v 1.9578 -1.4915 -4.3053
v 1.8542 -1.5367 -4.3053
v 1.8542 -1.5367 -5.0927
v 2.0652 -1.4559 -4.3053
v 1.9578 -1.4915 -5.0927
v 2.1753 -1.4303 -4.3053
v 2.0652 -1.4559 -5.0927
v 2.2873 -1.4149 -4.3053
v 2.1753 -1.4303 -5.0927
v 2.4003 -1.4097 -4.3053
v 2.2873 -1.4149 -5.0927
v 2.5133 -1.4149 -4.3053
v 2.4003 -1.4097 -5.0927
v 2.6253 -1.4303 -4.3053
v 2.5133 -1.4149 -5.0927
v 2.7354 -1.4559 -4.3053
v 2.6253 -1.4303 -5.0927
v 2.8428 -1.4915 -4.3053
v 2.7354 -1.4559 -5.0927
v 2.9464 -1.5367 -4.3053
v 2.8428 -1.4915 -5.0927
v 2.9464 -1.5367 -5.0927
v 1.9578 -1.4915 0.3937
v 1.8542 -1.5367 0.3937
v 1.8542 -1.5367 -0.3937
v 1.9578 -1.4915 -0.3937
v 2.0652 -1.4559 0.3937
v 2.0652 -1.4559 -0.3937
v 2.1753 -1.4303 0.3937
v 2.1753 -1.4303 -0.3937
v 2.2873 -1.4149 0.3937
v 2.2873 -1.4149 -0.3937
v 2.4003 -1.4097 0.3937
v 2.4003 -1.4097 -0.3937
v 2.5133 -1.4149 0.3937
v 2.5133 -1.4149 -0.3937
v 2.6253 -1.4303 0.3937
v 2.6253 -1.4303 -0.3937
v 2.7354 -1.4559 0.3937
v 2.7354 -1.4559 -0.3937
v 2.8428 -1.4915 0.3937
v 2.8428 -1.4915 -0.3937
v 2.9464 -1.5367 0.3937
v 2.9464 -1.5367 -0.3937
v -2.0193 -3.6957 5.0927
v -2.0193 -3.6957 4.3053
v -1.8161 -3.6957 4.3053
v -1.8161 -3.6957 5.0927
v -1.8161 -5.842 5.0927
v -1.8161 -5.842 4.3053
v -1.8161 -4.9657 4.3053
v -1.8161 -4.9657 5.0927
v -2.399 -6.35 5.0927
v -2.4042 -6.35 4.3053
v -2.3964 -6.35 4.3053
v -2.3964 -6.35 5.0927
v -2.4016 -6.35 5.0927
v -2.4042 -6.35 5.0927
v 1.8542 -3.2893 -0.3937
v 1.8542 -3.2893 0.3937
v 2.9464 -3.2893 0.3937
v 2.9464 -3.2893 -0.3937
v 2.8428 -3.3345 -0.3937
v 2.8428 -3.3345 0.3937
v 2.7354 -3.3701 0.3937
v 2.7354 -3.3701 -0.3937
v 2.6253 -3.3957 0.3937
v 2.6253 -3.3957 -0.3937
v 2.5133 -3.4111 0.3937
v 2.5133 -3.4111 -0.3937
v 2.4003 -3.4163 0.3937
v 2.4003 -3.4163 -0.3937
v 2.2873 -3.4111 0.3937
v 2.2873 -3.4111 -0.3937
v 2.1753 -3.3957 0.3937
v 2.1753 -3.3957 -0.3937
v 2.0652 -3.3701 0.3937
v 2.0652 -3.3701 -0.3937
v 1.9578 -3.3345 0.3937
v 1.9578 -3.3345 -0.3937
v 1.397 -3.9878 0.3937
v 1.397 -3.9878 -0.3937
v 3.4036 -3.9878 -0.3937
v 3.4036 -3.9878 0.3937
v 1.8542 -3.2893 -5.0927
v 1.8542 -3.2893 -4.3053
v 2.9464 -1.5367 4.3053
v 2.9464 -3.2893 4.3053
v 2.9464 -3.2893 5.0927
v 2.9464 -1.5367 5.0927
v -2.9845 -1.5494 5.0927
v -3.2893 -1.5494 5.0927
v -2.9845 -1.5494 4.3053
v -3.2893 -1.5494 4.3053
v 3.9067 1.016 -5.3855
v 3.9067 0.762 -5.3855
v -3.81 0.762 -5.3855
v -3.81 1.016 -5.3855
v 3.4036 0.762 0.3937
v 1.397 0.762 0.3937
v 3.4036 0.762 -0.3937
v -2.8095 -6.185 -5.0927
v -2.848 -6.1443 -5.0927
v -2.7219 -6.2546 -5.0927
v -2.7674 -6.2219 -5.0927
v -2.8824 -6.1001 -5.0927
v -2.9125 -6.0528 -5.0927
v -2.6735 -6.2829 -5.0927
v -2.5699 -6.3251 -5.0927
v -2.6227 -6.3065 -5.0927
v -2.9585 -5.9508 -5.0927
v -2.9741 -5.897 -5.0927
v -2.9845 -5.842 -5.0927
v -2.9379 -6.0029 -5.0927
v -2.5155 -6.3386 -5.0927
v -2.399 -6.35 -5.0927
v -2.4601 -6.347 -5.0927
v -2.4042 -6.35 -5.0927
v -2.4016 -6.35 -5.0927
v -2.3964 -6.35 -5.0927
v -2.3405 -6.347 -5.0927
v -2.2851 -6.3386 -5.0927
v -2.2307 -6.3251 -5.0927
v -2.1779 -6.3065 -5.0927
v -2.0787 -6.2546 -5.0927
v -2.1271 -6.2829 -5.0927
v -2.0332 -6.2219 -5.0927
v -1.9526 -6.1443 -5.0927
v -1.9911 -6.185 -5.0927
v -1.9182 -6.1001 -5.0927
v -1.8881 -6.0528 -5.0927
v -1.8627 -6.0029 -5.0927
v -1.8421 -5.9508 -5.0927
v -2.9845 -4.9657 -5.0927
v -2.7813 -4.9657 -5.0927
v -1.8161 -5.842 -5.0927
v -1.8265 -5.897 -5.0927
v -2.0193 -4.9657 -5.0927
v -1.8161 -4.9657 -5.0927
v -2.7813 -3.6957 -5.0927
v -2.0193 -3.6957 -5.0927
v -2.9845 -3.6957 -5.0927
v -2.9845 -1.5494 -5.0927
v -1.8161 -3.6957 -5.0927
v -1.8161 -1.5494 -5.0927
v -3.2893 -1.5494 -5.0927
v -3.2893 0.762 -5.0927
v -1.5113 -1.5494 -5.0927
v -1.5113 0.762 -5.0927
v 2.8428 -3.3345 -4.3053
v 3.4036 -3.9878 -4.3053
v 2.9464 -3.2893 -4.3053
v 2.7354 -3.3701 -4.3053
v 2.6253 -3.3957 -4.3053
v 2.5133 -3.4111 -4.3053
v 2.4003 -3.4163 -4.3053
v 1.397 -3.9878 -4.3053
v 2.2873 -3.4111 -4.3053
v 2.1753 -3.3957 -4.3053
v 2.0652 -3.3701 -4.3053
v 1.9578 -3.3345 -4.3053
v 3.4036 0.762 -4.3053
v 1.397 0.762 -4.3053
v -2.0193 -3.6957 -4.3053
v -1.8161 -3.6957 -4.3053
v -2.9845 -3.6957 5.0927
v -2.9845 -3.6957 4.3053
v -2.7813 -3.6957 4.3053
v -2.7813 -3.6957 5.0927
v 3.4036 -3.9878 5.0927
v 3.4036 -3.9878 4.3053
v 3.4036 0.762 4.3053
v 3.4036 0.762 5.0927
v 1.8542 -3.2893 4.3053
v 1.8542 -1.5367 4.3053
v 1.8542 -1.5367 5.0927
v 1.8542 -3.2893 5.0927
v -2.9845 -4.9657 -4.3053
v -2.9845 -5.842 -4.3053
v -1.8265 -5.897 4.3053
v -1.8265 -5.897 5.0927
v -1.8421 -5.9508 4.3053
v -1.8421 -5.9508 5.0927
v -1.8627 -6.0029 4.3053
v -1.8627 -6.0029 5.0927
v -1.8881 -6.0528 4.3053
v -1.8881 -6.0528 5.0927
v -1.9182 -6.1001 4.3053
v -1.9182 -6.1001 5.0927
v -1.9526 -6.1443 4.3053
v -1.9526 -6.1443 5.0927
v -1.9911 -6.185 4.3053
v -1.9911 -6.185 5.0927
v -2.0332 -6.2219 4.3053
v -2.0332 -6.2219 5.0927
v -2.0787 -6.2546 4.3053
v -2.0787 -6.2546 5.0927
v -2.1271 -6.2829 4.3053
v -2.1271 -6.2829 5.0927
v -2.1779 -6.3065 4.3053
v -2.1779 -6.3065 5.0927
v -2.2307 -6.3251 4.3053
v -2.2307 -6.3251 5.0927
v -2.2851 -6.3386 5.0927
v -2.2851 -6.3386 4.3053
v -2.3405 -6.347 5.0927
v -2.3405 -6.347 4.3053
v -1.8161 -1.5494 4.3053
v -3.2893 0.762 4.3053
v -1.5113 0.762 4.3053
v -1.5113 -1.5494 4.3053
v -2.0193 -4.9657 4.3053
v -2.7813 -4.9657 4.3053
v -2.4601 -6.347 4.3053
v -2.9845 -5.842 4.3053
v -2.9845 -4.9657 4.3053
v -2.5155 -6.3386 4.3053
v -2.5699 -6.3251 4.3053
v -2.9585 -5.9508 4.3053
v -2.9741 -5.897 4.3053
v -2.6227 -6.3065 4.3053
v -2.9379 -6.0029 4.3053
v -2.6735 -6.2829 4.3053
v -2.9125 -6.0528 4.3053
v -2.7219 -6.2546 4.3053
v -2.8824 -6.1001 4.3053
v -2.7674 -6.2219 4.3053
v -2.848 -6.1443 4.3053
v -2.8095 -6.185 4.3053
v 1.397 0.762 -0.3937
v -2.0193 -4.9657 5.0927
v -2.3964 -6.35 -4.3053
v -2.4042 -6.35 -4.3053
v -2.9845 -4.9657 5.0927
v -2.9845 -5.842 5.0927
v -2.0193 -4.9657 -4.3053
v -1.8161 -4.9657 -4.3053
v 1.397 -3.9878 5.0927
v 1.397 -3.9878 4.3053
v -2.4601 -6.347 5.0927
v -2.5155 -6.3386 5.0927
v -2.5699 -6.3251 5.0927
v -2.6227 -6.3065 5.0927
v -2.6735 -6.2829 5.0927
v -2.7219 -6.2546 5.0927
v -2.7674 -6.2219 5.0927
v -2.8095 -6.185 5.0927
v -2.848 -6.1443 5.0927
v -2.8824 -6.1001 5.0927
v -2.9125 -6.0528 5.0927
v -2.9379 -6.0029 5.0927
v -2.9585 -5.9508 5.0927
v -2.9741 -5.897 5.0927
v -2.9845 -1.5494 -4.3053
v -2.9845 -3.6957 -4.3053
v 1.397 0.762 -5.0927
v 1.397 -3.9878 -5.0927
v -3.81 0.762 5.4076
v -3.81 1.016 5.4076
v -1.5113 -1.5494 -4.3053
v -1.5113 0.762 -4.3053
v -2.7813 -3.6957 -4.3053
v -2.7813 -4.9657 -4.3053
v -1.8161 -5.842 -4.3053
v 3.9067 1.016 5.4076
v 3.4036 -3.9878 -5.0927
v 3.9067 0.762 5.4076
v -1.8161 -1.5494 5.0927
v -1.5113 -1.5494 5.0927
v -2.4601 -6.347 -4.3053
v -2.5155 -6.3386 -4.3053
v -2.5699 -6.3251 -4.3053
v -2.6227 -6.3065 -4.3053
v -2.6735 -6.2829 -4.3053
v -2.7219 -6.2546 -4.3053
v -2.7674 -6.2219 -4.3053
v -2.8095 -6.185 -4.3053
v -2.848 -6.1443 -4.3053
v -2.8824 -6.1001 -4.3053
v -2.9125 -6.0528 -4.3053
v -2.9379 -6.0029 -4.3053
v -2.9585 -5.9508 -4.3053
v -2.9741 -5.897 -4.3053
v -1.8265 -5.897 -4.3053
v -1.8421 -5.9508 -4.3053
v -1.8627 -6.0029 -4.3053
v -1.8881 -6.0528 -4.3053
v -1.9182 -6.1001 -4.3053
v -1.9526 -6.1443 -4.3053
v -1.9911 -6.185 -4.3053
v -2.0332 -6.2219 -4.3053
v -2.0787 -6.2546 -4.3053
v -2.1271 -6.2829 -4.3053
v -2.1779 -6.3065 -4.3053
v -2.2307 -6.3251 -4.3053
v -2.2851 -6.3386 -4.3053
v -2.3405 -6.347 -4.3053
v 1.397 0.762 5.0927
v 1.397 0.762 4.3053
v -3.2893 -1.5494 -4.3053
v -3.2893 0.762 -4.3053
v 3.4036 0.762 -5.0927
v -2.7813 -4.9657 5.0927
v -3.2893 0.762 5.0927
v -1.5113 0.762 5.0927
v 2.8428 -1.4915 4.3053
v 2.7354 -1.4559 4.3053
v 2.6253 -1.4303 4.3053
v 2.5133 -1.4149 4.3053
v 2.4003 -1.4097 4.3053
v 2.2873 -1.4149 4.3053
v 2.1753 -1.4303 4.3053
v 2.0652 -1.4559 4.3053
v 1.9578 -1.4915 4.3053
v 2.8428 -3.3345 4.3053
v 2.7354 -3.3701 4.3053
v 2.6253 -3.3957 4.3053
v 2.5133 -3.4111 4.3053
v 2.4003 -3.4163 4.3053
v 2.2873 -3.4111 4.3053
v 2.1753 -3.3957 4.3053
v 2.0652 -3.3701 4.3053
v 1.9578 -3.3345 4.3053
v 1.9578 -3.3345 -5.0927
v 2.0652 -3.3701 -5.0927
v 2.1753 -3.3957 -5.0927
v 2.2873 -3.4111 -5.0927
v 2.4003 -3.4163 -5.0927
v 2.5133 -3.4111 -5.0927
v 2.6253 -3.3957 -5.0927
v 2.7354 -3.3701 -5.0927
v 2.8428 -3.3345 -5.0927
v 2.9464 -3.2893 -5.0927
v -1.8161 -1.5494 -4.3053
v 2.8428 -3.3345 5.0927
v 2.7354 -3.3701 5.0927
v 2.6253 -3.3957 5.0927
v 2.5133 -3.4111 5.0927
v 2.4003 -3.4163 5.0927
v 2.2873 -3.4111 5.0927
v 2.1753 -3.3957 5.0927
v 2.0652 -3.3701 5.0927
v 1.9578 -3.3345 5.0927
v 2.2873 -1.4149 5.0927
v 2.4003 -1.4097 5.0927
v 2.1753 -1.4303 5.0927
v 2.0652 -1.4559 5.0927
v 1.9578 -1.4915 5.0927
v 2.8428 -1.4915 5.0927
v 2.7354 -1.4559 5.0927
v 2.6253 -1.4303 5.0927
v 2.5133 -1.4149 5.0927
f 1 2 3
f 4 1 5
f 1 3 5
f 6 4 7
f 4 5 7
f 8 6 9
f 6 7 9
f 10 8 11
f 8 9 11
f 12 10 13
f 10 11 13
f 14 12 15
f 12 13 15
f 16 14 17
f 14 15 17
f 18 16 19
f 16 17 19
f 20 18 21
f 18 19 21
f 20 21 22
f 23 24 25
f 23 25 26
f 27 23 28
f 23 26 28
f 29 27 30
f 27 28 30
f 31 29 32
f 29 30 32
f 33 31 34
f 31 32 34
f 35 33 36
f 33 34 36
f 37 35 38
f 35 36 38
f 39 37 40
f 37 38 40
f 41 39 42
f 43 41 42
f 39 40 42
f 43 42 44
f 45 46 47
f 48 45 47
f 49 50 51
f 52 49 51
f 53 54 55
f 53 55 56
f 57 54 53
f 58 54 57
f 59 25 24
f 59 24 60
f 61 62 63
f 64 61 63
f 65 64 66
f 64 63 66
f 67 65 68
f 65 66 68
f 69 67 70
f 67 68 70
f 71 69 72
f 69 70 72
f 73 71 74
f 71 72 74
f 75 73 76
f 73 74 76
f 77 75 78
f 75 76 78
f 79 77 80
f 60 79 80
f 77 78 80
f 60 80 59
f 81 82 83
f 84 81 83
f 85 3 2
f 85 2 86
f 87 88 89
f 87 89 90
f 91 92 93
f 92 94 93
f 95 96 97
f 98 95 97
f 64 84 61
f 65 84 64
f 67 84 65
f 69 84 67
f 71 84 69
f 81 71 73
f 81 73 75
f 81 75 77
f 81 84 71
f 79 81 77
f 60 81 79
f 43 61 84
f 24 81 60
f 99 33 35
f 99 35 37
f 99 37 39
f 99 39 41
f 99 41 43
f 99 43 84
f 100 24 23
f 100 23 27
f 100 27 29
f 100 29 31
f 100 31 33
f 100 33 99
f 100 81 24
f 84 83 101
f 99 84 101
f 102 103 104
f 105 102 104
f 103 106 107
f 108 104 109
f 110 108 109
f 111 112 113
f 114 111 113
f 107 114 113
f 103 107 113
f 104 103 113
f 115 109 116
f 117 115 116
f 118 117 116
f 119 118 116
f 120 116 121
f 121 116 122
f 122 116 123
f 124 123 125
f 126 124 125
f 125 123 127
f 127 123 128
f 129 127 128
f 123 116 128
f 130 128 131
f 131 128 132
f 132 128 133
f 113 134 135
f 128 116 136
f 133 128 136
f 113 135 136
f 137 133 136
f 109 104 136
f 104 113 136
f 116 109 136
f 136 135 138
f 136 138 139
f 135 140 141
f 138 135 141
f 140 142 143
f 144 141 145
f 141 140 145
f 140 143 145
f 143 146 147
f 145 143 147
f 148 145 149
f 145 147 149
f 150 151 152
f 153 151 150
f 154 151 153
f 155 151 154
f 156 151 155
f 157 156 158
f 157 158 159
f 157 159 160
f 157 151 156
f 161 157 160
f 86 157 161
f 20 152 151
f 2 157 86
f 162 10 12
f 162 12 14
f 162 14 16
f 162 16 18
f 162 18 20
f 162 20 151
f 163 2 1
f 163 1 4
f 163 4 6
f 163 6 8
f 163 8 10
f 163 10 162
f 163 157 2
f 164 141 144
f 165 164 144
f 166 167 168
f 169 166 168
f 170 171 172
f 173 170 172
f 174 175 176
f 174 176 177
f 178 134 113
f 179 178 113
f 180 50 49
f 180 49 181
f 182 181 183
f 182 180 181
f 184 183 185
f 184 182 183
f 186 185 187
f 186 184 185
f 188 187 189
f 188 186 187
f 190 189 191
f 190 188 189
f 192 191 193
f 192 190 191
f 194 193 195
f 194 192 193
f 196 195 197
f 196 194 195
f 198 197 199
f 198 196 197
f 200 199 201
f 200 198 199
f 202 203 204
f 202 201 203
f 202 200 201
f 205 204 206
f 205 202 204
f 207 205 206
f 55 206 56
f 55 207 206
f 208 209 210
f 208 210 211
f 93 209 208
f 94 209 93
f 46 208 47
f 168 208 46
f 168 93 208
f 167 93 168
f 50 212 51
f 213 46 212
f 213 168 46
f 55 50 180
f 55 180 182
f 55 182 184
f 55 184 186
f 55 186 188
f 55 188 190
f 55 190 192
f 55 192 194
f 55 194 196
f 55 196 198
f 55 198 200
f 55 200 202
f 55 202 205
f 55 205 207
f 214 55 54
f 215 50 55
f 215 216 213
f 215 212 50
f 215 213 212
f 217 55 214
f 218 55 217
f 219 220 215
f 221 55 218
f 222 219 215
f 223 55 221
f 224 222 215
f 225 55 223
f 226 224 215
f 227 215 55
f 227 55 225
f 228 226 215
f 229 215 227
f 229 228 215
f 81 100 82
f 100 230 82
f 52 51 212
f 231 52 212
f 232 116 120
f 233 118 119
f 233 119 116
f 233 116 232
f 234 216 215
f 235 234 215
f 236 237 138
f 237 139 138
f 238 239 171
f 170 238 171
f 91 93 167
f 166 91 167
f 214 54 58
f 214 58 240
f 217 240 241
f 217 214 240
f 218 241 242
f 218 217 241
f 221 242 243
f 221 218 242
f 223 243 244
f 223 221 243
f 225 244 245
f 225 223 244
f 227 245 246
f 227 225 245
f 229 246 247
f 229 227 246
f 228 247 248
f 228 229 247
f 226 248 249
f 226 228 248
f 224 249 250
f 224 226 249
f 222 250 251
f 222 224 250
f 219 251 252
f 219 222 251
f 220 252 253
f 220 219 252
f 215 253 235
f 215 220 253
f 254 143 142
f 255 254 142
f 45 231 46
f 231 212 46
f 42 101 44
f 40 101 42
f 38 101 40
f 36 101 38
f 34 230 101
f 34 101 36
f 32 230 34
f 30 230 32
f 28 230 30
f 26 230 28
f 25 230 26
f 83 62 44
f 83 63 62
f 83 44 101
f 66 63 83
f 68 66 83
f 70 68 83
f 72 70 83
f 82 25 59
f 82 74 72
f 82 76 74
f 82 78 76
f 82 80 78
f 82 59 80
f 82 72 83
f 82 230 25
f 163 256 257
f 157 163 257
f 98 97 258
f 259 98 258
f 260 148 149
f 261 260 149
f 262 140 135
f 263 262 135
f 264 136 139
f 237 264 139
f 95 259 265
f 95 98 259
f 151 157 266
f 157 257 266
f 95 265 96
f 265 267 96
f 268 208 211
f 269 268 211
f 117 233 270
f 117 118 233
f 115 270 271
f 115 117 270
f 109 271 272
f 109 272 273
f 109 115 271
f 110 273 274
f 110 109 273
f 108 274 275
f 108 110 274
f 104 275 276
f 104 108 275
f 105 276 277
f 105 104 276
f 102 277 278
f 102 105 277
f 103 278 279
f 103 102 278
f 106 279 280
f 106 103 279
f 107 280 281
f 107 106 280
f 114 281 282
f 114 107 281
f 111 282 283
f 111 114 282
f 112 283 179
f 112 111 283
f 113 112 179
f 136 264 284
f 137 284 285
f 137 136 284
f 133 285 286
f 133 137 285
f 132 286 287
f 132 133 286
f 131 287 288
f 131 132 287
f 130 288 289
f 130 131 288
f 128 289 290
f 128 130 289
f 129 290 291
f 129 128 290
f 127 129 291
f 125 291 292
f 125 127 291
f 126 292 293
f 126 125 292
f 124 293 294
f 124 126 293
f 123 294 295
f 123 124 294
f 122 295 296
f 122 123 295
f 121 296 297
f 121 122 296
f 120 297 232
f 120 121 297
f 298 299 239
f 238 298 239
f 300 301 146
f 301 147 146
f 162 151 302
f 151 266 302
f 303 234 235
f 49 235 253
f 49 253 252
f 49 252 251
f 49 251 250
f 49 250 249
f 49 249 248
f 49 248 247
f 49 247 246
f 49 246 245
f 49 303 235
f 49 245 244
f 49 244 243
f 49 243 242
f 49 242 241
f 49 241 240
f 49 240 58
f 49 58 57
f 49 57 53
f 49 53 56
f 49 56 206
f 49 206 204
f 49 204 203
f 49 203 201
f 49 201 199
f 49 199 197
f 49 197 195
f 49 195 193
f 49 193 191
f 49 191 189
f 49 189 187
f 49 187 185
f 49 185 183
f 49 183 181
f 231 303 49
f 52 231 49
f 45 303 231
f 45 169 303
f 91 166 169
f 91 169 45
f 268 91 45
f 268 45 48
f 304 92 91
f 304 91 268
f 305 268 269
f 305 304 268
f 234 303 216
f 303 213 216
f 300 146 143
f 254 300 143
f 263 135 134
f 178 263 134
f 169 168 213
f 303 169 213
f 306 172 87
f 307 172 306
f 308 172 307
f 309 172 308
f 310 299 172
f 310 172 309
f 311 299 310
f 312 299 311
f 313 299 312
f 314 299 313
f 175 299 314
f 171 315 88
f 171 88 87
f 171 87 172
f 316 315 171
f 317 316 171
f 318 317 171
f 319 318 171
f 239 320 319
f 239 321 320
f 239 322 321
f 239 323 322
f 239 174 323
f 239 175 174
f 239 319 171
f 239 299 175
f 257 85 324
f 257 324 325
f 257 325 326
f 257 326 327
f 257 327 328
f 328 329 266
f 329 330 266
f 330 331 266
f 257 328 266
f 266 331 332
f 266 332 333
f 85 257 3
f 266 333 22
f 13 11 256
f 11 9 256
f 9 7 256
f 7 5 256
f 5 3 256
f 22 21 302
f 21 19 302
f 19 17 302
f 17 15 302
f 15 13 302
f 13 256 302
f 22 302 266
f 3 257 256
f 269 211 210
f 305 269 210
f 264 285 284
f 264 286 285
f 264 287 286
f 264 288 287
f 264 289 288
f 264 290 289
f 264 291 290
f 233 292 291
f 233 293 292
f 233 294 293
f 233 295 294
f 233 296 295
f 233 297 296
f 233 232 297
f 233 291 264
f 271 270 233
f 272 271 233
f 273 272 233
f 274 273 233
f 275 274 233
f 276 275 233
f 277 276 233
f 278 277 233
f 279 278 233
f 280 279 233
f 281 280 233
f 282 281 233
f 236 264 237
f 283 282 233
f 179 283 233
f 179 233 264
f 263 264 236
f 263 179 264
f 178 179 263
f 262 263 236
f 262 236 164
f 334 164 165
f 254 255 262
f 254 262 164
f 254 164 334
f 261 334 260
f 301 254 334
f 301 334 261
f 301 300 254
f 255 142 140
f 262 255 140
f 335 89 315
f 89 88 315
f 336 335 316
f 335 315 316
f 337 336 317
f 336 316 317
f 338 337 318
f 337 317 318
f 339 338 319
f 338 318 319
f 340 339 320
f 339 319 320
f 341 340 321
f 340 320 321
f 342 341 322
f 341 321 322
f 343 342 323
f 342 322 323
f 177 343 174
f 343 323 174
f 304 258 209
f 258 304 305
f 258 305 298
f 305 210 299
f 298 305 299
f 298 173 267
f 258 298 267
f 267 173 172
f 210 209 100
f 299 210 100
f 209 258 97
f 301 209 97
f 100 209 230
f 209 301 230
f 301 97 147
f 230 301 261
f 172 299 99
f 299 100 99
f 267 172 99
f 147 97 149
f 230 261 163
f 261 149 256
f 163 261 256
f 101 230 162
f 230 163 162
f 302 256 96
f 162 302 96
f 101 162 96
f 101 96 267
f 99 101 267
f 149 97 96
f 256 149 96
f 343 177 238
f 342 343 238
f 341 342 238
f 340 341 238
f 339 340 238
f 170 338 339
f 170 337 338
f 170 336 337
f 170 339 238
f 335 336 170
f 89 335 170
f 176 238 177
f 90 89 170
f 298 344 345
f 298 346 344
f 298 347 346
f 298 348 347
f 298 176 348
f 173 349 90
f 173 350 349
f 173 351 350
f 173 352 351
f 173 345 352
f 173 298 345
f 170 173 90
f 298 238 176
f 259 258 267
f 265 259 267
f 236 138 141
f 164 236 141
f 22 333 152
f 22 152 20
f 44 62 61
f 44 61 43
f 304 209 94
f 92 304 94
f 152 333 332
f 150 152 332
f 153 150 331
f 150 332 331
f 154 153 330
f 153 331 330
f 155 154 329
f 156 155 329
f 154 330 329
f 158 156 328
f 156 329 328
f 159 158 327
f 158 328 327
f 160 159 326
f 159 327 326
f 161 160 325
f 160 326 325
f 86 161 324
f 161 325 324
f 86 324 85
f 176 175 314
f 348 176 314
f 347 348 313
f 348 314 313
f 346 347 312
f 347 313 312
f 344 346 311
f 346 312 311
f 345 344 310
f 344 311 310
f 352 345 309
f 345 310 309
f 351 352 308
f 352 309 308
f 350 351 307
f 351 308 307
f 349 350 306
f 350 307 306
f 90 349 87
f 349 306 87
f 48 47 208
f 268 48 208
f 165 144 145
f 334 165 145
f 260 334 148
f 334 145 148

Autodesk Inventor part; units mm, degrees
sketch "Sketch_1" plane through (0, 0.762, 0) normal (0, 1, 0) x (1, 0, 0)
  line L0 (-6.096, 6.096) -> (-6.096, -6.096)
  line L1 (-6.096, -6.096) -> (6.096, -6.096)
  line L2 (6.096, -6.096) -> (6.096, 6.096)
  line L3 (6.096, 6.096) -> (-6.096, 6.096)
extrude "Extrusion1" add sketch "Sketch_1" along normal blind 0.254
sketch "Sketch_2" plane through (0, 0, 0) normal (0, 0, 1) x (1, 0, 0)
  line L0 (1.397, -3.9878) -> (3.4036, -3.9878)
  line L1 (3.4036, -3.9878) -> (3.4036, 0.762)
  line L2 (3.4036, 0.762) -> (1.397, 0.762)
  line L3 (1.397, 0.762) -> (1.397, -3.9878)
  line L4 (1.8542, -1.5367) -> (1.8542, -3.2893)
  arc A0 (1.8542, -3.2893) -> (2.9464, -3.2893) centre (2.4003, -2.1787) ccw
  line L5 (2.9464, -3.2893) -> (2.9464, -1.5367)
  arc A1 (2.9464, -1.5367) -> (1.8542, -1.5367) centre (2.4003, -2.6473) ccw
extrude "Extrusion2" add sketch "Sketch_2" along normal mid plane 10.1854
sketch "Sketch_3" plane through (0, 0, 0) normal (0, 0, 1) x (1, 0, 0)
  line L0 (-3.2893, -1.5494) -> (-2.9845, -1.5494)
  line L1 (-2.9845, -1.5494) -> (-2.9845, -3.6957)
  line L2 (-2.9845, -3.6957) -> (-2.7813, -3.6957)
  line L3 (-2.7813, -3.6957) -> (-2.7813, -4.9657)
  line L4 (-2.7813, -4.9657) -> (-2.9845, -4.9657)
  line L5 (-2.9845, -4.9657) -> (-2.9845, -5.842)
  arc A0 (-2.9845, -5.842) -> (-1.8161, -5.842) centre (-2.4003, -5.7601) ccw
  line L6 (-1.8161, -5.842) -> (-1.8161, -4.9657)
  line L7 (-1.8161, -4.9657) -> (-2.0193, -4.9657)
  line L8 (-2.0193, -4.9657) -> (-2.0193, -3.6957)
  line L9 (-2.0193, -3.6957) -> (-1.8161, -3.6957)
  line L10 (-1.8161, -3.6957) -> (-1.8161, -1.5494)
  line L11 (-1.8161, -1.5494) -> (-1.5113, -1.5494)
  line L12 (-1.5113, -1.5494) -> (-1.5113, 0.762)
  line L13 (-1.5113, 0.762) -> (-3.2893, 0.762)
  line L14 (-3.2893, 0.762) -> (-3.2893, -1.5494)
extrude "Extrusion3" add sketch "Sketch_3" along normal mid plane 10.1854
sketch "Sketch_4" plane through (0, 0, 0) normal (1, 0, 0) x (0, 1, 0)
  line L0 (-7.1882, 5.9756) -> (-7.1882, -5.9196)
  line L1 (-7.1882, -5.9196) -> (0.762, -5.9196)
  line L2 (0.762, -5.9196) -> (0.762, -5.0927)
  line L3 (0.762, -5.0927) -> (-6.35, -5.0927)
  line L4 (-6.35, -5.0927) -> (-6.35, -4.3053)
  line L5 (-6.35, -4.3053) -> (0.762, -4.3053)
  line L6 (0.762, -4.3053) -> (0.762, -0.3937)
  line L7 (0.762, -0.3937) -> (-6.35, -0.3937)
  line L8 (-6.35, -0.3937) -> (-6.35, 0.3937)
  line L9 (-6.35, 0.3937) -> (0.762, 0.3937)
  line L10 (0.762, 0.3937) -> (0.762, 4.3053)
  line L11 (0.762, 4.3053) -> (-6.35, 4.3053)
  line L12 (-6.35, 4.3053) -> (-6.35, 5.0927)
  line L13 (-6.35, 5.0927) -> (0.762, 5.0927)
  line L14 (0.762, 5.0927) -> (0.762, 5.9756)
  line L15 (0.762, 5.9756) -> (-7.1882, 5.9756)
extrude "Extrusion4" cut sketch "Sketch_4" along normal mid plane 10.16
sketch "Sketch_19" plane through (0, 0.762, 0) normal (0, 1, 0) x (1, 0, 0)
  line L0 (-6.096, 6.096) -> (-6.096, -6.096)
  line L1 (-6.096, -6.096) -> (6.096, -6.096)
  line L2 (6.096, -6.096) -> (6.096, 6.096)
  line L3 (6.096, 6.096) -> (-6.096, 6.096)
  line L4 (-3.81, -5.4076) -> (3.9067, -5.4076)
  line L5 (3.9067, -5.4076) -> (3.9067, 5.3855)
  line L6 (3.9067, 5.3855) -> (-3.81, 5.3855)
  line L7 (-3.81, 5.3855) -> (-3.81, -5.4076)
extrude "Extrusion5" cut sketch "Sketch_19" along normal blind 2.54
sketch "Sketch_24" plane through (0, 0, 0) normal (0, 0, 1) x (1, 0, 0)
  line L0 (-8.7503, -7.62) -> (-1.2573, -7.62)
  line L1 (-1.2573, -7.62) -> (-1.2573, 0.762)
  line L2 (-1.2573, 0.762) -> (-8.7503, 0.762)
  line L3 (-8.7503, 0.762) -> (-8.7503, -7.62)
extrude "Extrusion6" cut sketch "Sketch_24" along normal mid plane 2.54
ref_plane "terminal_to_body_XY" through (0, 0, 0) normal (0, 1, 0) x (1, 0, 0)
ref_plane "terminal_to_body_YZ" through (0, 0, 0) normal (1, 0, 0) x (0, 0, -1)
ref_plane "terminal_to_body_ZX" through (0, 0, 0) normal (0, 0, -1) x (0, 1, 0)
properties part number "M211LCW01-terminals"
